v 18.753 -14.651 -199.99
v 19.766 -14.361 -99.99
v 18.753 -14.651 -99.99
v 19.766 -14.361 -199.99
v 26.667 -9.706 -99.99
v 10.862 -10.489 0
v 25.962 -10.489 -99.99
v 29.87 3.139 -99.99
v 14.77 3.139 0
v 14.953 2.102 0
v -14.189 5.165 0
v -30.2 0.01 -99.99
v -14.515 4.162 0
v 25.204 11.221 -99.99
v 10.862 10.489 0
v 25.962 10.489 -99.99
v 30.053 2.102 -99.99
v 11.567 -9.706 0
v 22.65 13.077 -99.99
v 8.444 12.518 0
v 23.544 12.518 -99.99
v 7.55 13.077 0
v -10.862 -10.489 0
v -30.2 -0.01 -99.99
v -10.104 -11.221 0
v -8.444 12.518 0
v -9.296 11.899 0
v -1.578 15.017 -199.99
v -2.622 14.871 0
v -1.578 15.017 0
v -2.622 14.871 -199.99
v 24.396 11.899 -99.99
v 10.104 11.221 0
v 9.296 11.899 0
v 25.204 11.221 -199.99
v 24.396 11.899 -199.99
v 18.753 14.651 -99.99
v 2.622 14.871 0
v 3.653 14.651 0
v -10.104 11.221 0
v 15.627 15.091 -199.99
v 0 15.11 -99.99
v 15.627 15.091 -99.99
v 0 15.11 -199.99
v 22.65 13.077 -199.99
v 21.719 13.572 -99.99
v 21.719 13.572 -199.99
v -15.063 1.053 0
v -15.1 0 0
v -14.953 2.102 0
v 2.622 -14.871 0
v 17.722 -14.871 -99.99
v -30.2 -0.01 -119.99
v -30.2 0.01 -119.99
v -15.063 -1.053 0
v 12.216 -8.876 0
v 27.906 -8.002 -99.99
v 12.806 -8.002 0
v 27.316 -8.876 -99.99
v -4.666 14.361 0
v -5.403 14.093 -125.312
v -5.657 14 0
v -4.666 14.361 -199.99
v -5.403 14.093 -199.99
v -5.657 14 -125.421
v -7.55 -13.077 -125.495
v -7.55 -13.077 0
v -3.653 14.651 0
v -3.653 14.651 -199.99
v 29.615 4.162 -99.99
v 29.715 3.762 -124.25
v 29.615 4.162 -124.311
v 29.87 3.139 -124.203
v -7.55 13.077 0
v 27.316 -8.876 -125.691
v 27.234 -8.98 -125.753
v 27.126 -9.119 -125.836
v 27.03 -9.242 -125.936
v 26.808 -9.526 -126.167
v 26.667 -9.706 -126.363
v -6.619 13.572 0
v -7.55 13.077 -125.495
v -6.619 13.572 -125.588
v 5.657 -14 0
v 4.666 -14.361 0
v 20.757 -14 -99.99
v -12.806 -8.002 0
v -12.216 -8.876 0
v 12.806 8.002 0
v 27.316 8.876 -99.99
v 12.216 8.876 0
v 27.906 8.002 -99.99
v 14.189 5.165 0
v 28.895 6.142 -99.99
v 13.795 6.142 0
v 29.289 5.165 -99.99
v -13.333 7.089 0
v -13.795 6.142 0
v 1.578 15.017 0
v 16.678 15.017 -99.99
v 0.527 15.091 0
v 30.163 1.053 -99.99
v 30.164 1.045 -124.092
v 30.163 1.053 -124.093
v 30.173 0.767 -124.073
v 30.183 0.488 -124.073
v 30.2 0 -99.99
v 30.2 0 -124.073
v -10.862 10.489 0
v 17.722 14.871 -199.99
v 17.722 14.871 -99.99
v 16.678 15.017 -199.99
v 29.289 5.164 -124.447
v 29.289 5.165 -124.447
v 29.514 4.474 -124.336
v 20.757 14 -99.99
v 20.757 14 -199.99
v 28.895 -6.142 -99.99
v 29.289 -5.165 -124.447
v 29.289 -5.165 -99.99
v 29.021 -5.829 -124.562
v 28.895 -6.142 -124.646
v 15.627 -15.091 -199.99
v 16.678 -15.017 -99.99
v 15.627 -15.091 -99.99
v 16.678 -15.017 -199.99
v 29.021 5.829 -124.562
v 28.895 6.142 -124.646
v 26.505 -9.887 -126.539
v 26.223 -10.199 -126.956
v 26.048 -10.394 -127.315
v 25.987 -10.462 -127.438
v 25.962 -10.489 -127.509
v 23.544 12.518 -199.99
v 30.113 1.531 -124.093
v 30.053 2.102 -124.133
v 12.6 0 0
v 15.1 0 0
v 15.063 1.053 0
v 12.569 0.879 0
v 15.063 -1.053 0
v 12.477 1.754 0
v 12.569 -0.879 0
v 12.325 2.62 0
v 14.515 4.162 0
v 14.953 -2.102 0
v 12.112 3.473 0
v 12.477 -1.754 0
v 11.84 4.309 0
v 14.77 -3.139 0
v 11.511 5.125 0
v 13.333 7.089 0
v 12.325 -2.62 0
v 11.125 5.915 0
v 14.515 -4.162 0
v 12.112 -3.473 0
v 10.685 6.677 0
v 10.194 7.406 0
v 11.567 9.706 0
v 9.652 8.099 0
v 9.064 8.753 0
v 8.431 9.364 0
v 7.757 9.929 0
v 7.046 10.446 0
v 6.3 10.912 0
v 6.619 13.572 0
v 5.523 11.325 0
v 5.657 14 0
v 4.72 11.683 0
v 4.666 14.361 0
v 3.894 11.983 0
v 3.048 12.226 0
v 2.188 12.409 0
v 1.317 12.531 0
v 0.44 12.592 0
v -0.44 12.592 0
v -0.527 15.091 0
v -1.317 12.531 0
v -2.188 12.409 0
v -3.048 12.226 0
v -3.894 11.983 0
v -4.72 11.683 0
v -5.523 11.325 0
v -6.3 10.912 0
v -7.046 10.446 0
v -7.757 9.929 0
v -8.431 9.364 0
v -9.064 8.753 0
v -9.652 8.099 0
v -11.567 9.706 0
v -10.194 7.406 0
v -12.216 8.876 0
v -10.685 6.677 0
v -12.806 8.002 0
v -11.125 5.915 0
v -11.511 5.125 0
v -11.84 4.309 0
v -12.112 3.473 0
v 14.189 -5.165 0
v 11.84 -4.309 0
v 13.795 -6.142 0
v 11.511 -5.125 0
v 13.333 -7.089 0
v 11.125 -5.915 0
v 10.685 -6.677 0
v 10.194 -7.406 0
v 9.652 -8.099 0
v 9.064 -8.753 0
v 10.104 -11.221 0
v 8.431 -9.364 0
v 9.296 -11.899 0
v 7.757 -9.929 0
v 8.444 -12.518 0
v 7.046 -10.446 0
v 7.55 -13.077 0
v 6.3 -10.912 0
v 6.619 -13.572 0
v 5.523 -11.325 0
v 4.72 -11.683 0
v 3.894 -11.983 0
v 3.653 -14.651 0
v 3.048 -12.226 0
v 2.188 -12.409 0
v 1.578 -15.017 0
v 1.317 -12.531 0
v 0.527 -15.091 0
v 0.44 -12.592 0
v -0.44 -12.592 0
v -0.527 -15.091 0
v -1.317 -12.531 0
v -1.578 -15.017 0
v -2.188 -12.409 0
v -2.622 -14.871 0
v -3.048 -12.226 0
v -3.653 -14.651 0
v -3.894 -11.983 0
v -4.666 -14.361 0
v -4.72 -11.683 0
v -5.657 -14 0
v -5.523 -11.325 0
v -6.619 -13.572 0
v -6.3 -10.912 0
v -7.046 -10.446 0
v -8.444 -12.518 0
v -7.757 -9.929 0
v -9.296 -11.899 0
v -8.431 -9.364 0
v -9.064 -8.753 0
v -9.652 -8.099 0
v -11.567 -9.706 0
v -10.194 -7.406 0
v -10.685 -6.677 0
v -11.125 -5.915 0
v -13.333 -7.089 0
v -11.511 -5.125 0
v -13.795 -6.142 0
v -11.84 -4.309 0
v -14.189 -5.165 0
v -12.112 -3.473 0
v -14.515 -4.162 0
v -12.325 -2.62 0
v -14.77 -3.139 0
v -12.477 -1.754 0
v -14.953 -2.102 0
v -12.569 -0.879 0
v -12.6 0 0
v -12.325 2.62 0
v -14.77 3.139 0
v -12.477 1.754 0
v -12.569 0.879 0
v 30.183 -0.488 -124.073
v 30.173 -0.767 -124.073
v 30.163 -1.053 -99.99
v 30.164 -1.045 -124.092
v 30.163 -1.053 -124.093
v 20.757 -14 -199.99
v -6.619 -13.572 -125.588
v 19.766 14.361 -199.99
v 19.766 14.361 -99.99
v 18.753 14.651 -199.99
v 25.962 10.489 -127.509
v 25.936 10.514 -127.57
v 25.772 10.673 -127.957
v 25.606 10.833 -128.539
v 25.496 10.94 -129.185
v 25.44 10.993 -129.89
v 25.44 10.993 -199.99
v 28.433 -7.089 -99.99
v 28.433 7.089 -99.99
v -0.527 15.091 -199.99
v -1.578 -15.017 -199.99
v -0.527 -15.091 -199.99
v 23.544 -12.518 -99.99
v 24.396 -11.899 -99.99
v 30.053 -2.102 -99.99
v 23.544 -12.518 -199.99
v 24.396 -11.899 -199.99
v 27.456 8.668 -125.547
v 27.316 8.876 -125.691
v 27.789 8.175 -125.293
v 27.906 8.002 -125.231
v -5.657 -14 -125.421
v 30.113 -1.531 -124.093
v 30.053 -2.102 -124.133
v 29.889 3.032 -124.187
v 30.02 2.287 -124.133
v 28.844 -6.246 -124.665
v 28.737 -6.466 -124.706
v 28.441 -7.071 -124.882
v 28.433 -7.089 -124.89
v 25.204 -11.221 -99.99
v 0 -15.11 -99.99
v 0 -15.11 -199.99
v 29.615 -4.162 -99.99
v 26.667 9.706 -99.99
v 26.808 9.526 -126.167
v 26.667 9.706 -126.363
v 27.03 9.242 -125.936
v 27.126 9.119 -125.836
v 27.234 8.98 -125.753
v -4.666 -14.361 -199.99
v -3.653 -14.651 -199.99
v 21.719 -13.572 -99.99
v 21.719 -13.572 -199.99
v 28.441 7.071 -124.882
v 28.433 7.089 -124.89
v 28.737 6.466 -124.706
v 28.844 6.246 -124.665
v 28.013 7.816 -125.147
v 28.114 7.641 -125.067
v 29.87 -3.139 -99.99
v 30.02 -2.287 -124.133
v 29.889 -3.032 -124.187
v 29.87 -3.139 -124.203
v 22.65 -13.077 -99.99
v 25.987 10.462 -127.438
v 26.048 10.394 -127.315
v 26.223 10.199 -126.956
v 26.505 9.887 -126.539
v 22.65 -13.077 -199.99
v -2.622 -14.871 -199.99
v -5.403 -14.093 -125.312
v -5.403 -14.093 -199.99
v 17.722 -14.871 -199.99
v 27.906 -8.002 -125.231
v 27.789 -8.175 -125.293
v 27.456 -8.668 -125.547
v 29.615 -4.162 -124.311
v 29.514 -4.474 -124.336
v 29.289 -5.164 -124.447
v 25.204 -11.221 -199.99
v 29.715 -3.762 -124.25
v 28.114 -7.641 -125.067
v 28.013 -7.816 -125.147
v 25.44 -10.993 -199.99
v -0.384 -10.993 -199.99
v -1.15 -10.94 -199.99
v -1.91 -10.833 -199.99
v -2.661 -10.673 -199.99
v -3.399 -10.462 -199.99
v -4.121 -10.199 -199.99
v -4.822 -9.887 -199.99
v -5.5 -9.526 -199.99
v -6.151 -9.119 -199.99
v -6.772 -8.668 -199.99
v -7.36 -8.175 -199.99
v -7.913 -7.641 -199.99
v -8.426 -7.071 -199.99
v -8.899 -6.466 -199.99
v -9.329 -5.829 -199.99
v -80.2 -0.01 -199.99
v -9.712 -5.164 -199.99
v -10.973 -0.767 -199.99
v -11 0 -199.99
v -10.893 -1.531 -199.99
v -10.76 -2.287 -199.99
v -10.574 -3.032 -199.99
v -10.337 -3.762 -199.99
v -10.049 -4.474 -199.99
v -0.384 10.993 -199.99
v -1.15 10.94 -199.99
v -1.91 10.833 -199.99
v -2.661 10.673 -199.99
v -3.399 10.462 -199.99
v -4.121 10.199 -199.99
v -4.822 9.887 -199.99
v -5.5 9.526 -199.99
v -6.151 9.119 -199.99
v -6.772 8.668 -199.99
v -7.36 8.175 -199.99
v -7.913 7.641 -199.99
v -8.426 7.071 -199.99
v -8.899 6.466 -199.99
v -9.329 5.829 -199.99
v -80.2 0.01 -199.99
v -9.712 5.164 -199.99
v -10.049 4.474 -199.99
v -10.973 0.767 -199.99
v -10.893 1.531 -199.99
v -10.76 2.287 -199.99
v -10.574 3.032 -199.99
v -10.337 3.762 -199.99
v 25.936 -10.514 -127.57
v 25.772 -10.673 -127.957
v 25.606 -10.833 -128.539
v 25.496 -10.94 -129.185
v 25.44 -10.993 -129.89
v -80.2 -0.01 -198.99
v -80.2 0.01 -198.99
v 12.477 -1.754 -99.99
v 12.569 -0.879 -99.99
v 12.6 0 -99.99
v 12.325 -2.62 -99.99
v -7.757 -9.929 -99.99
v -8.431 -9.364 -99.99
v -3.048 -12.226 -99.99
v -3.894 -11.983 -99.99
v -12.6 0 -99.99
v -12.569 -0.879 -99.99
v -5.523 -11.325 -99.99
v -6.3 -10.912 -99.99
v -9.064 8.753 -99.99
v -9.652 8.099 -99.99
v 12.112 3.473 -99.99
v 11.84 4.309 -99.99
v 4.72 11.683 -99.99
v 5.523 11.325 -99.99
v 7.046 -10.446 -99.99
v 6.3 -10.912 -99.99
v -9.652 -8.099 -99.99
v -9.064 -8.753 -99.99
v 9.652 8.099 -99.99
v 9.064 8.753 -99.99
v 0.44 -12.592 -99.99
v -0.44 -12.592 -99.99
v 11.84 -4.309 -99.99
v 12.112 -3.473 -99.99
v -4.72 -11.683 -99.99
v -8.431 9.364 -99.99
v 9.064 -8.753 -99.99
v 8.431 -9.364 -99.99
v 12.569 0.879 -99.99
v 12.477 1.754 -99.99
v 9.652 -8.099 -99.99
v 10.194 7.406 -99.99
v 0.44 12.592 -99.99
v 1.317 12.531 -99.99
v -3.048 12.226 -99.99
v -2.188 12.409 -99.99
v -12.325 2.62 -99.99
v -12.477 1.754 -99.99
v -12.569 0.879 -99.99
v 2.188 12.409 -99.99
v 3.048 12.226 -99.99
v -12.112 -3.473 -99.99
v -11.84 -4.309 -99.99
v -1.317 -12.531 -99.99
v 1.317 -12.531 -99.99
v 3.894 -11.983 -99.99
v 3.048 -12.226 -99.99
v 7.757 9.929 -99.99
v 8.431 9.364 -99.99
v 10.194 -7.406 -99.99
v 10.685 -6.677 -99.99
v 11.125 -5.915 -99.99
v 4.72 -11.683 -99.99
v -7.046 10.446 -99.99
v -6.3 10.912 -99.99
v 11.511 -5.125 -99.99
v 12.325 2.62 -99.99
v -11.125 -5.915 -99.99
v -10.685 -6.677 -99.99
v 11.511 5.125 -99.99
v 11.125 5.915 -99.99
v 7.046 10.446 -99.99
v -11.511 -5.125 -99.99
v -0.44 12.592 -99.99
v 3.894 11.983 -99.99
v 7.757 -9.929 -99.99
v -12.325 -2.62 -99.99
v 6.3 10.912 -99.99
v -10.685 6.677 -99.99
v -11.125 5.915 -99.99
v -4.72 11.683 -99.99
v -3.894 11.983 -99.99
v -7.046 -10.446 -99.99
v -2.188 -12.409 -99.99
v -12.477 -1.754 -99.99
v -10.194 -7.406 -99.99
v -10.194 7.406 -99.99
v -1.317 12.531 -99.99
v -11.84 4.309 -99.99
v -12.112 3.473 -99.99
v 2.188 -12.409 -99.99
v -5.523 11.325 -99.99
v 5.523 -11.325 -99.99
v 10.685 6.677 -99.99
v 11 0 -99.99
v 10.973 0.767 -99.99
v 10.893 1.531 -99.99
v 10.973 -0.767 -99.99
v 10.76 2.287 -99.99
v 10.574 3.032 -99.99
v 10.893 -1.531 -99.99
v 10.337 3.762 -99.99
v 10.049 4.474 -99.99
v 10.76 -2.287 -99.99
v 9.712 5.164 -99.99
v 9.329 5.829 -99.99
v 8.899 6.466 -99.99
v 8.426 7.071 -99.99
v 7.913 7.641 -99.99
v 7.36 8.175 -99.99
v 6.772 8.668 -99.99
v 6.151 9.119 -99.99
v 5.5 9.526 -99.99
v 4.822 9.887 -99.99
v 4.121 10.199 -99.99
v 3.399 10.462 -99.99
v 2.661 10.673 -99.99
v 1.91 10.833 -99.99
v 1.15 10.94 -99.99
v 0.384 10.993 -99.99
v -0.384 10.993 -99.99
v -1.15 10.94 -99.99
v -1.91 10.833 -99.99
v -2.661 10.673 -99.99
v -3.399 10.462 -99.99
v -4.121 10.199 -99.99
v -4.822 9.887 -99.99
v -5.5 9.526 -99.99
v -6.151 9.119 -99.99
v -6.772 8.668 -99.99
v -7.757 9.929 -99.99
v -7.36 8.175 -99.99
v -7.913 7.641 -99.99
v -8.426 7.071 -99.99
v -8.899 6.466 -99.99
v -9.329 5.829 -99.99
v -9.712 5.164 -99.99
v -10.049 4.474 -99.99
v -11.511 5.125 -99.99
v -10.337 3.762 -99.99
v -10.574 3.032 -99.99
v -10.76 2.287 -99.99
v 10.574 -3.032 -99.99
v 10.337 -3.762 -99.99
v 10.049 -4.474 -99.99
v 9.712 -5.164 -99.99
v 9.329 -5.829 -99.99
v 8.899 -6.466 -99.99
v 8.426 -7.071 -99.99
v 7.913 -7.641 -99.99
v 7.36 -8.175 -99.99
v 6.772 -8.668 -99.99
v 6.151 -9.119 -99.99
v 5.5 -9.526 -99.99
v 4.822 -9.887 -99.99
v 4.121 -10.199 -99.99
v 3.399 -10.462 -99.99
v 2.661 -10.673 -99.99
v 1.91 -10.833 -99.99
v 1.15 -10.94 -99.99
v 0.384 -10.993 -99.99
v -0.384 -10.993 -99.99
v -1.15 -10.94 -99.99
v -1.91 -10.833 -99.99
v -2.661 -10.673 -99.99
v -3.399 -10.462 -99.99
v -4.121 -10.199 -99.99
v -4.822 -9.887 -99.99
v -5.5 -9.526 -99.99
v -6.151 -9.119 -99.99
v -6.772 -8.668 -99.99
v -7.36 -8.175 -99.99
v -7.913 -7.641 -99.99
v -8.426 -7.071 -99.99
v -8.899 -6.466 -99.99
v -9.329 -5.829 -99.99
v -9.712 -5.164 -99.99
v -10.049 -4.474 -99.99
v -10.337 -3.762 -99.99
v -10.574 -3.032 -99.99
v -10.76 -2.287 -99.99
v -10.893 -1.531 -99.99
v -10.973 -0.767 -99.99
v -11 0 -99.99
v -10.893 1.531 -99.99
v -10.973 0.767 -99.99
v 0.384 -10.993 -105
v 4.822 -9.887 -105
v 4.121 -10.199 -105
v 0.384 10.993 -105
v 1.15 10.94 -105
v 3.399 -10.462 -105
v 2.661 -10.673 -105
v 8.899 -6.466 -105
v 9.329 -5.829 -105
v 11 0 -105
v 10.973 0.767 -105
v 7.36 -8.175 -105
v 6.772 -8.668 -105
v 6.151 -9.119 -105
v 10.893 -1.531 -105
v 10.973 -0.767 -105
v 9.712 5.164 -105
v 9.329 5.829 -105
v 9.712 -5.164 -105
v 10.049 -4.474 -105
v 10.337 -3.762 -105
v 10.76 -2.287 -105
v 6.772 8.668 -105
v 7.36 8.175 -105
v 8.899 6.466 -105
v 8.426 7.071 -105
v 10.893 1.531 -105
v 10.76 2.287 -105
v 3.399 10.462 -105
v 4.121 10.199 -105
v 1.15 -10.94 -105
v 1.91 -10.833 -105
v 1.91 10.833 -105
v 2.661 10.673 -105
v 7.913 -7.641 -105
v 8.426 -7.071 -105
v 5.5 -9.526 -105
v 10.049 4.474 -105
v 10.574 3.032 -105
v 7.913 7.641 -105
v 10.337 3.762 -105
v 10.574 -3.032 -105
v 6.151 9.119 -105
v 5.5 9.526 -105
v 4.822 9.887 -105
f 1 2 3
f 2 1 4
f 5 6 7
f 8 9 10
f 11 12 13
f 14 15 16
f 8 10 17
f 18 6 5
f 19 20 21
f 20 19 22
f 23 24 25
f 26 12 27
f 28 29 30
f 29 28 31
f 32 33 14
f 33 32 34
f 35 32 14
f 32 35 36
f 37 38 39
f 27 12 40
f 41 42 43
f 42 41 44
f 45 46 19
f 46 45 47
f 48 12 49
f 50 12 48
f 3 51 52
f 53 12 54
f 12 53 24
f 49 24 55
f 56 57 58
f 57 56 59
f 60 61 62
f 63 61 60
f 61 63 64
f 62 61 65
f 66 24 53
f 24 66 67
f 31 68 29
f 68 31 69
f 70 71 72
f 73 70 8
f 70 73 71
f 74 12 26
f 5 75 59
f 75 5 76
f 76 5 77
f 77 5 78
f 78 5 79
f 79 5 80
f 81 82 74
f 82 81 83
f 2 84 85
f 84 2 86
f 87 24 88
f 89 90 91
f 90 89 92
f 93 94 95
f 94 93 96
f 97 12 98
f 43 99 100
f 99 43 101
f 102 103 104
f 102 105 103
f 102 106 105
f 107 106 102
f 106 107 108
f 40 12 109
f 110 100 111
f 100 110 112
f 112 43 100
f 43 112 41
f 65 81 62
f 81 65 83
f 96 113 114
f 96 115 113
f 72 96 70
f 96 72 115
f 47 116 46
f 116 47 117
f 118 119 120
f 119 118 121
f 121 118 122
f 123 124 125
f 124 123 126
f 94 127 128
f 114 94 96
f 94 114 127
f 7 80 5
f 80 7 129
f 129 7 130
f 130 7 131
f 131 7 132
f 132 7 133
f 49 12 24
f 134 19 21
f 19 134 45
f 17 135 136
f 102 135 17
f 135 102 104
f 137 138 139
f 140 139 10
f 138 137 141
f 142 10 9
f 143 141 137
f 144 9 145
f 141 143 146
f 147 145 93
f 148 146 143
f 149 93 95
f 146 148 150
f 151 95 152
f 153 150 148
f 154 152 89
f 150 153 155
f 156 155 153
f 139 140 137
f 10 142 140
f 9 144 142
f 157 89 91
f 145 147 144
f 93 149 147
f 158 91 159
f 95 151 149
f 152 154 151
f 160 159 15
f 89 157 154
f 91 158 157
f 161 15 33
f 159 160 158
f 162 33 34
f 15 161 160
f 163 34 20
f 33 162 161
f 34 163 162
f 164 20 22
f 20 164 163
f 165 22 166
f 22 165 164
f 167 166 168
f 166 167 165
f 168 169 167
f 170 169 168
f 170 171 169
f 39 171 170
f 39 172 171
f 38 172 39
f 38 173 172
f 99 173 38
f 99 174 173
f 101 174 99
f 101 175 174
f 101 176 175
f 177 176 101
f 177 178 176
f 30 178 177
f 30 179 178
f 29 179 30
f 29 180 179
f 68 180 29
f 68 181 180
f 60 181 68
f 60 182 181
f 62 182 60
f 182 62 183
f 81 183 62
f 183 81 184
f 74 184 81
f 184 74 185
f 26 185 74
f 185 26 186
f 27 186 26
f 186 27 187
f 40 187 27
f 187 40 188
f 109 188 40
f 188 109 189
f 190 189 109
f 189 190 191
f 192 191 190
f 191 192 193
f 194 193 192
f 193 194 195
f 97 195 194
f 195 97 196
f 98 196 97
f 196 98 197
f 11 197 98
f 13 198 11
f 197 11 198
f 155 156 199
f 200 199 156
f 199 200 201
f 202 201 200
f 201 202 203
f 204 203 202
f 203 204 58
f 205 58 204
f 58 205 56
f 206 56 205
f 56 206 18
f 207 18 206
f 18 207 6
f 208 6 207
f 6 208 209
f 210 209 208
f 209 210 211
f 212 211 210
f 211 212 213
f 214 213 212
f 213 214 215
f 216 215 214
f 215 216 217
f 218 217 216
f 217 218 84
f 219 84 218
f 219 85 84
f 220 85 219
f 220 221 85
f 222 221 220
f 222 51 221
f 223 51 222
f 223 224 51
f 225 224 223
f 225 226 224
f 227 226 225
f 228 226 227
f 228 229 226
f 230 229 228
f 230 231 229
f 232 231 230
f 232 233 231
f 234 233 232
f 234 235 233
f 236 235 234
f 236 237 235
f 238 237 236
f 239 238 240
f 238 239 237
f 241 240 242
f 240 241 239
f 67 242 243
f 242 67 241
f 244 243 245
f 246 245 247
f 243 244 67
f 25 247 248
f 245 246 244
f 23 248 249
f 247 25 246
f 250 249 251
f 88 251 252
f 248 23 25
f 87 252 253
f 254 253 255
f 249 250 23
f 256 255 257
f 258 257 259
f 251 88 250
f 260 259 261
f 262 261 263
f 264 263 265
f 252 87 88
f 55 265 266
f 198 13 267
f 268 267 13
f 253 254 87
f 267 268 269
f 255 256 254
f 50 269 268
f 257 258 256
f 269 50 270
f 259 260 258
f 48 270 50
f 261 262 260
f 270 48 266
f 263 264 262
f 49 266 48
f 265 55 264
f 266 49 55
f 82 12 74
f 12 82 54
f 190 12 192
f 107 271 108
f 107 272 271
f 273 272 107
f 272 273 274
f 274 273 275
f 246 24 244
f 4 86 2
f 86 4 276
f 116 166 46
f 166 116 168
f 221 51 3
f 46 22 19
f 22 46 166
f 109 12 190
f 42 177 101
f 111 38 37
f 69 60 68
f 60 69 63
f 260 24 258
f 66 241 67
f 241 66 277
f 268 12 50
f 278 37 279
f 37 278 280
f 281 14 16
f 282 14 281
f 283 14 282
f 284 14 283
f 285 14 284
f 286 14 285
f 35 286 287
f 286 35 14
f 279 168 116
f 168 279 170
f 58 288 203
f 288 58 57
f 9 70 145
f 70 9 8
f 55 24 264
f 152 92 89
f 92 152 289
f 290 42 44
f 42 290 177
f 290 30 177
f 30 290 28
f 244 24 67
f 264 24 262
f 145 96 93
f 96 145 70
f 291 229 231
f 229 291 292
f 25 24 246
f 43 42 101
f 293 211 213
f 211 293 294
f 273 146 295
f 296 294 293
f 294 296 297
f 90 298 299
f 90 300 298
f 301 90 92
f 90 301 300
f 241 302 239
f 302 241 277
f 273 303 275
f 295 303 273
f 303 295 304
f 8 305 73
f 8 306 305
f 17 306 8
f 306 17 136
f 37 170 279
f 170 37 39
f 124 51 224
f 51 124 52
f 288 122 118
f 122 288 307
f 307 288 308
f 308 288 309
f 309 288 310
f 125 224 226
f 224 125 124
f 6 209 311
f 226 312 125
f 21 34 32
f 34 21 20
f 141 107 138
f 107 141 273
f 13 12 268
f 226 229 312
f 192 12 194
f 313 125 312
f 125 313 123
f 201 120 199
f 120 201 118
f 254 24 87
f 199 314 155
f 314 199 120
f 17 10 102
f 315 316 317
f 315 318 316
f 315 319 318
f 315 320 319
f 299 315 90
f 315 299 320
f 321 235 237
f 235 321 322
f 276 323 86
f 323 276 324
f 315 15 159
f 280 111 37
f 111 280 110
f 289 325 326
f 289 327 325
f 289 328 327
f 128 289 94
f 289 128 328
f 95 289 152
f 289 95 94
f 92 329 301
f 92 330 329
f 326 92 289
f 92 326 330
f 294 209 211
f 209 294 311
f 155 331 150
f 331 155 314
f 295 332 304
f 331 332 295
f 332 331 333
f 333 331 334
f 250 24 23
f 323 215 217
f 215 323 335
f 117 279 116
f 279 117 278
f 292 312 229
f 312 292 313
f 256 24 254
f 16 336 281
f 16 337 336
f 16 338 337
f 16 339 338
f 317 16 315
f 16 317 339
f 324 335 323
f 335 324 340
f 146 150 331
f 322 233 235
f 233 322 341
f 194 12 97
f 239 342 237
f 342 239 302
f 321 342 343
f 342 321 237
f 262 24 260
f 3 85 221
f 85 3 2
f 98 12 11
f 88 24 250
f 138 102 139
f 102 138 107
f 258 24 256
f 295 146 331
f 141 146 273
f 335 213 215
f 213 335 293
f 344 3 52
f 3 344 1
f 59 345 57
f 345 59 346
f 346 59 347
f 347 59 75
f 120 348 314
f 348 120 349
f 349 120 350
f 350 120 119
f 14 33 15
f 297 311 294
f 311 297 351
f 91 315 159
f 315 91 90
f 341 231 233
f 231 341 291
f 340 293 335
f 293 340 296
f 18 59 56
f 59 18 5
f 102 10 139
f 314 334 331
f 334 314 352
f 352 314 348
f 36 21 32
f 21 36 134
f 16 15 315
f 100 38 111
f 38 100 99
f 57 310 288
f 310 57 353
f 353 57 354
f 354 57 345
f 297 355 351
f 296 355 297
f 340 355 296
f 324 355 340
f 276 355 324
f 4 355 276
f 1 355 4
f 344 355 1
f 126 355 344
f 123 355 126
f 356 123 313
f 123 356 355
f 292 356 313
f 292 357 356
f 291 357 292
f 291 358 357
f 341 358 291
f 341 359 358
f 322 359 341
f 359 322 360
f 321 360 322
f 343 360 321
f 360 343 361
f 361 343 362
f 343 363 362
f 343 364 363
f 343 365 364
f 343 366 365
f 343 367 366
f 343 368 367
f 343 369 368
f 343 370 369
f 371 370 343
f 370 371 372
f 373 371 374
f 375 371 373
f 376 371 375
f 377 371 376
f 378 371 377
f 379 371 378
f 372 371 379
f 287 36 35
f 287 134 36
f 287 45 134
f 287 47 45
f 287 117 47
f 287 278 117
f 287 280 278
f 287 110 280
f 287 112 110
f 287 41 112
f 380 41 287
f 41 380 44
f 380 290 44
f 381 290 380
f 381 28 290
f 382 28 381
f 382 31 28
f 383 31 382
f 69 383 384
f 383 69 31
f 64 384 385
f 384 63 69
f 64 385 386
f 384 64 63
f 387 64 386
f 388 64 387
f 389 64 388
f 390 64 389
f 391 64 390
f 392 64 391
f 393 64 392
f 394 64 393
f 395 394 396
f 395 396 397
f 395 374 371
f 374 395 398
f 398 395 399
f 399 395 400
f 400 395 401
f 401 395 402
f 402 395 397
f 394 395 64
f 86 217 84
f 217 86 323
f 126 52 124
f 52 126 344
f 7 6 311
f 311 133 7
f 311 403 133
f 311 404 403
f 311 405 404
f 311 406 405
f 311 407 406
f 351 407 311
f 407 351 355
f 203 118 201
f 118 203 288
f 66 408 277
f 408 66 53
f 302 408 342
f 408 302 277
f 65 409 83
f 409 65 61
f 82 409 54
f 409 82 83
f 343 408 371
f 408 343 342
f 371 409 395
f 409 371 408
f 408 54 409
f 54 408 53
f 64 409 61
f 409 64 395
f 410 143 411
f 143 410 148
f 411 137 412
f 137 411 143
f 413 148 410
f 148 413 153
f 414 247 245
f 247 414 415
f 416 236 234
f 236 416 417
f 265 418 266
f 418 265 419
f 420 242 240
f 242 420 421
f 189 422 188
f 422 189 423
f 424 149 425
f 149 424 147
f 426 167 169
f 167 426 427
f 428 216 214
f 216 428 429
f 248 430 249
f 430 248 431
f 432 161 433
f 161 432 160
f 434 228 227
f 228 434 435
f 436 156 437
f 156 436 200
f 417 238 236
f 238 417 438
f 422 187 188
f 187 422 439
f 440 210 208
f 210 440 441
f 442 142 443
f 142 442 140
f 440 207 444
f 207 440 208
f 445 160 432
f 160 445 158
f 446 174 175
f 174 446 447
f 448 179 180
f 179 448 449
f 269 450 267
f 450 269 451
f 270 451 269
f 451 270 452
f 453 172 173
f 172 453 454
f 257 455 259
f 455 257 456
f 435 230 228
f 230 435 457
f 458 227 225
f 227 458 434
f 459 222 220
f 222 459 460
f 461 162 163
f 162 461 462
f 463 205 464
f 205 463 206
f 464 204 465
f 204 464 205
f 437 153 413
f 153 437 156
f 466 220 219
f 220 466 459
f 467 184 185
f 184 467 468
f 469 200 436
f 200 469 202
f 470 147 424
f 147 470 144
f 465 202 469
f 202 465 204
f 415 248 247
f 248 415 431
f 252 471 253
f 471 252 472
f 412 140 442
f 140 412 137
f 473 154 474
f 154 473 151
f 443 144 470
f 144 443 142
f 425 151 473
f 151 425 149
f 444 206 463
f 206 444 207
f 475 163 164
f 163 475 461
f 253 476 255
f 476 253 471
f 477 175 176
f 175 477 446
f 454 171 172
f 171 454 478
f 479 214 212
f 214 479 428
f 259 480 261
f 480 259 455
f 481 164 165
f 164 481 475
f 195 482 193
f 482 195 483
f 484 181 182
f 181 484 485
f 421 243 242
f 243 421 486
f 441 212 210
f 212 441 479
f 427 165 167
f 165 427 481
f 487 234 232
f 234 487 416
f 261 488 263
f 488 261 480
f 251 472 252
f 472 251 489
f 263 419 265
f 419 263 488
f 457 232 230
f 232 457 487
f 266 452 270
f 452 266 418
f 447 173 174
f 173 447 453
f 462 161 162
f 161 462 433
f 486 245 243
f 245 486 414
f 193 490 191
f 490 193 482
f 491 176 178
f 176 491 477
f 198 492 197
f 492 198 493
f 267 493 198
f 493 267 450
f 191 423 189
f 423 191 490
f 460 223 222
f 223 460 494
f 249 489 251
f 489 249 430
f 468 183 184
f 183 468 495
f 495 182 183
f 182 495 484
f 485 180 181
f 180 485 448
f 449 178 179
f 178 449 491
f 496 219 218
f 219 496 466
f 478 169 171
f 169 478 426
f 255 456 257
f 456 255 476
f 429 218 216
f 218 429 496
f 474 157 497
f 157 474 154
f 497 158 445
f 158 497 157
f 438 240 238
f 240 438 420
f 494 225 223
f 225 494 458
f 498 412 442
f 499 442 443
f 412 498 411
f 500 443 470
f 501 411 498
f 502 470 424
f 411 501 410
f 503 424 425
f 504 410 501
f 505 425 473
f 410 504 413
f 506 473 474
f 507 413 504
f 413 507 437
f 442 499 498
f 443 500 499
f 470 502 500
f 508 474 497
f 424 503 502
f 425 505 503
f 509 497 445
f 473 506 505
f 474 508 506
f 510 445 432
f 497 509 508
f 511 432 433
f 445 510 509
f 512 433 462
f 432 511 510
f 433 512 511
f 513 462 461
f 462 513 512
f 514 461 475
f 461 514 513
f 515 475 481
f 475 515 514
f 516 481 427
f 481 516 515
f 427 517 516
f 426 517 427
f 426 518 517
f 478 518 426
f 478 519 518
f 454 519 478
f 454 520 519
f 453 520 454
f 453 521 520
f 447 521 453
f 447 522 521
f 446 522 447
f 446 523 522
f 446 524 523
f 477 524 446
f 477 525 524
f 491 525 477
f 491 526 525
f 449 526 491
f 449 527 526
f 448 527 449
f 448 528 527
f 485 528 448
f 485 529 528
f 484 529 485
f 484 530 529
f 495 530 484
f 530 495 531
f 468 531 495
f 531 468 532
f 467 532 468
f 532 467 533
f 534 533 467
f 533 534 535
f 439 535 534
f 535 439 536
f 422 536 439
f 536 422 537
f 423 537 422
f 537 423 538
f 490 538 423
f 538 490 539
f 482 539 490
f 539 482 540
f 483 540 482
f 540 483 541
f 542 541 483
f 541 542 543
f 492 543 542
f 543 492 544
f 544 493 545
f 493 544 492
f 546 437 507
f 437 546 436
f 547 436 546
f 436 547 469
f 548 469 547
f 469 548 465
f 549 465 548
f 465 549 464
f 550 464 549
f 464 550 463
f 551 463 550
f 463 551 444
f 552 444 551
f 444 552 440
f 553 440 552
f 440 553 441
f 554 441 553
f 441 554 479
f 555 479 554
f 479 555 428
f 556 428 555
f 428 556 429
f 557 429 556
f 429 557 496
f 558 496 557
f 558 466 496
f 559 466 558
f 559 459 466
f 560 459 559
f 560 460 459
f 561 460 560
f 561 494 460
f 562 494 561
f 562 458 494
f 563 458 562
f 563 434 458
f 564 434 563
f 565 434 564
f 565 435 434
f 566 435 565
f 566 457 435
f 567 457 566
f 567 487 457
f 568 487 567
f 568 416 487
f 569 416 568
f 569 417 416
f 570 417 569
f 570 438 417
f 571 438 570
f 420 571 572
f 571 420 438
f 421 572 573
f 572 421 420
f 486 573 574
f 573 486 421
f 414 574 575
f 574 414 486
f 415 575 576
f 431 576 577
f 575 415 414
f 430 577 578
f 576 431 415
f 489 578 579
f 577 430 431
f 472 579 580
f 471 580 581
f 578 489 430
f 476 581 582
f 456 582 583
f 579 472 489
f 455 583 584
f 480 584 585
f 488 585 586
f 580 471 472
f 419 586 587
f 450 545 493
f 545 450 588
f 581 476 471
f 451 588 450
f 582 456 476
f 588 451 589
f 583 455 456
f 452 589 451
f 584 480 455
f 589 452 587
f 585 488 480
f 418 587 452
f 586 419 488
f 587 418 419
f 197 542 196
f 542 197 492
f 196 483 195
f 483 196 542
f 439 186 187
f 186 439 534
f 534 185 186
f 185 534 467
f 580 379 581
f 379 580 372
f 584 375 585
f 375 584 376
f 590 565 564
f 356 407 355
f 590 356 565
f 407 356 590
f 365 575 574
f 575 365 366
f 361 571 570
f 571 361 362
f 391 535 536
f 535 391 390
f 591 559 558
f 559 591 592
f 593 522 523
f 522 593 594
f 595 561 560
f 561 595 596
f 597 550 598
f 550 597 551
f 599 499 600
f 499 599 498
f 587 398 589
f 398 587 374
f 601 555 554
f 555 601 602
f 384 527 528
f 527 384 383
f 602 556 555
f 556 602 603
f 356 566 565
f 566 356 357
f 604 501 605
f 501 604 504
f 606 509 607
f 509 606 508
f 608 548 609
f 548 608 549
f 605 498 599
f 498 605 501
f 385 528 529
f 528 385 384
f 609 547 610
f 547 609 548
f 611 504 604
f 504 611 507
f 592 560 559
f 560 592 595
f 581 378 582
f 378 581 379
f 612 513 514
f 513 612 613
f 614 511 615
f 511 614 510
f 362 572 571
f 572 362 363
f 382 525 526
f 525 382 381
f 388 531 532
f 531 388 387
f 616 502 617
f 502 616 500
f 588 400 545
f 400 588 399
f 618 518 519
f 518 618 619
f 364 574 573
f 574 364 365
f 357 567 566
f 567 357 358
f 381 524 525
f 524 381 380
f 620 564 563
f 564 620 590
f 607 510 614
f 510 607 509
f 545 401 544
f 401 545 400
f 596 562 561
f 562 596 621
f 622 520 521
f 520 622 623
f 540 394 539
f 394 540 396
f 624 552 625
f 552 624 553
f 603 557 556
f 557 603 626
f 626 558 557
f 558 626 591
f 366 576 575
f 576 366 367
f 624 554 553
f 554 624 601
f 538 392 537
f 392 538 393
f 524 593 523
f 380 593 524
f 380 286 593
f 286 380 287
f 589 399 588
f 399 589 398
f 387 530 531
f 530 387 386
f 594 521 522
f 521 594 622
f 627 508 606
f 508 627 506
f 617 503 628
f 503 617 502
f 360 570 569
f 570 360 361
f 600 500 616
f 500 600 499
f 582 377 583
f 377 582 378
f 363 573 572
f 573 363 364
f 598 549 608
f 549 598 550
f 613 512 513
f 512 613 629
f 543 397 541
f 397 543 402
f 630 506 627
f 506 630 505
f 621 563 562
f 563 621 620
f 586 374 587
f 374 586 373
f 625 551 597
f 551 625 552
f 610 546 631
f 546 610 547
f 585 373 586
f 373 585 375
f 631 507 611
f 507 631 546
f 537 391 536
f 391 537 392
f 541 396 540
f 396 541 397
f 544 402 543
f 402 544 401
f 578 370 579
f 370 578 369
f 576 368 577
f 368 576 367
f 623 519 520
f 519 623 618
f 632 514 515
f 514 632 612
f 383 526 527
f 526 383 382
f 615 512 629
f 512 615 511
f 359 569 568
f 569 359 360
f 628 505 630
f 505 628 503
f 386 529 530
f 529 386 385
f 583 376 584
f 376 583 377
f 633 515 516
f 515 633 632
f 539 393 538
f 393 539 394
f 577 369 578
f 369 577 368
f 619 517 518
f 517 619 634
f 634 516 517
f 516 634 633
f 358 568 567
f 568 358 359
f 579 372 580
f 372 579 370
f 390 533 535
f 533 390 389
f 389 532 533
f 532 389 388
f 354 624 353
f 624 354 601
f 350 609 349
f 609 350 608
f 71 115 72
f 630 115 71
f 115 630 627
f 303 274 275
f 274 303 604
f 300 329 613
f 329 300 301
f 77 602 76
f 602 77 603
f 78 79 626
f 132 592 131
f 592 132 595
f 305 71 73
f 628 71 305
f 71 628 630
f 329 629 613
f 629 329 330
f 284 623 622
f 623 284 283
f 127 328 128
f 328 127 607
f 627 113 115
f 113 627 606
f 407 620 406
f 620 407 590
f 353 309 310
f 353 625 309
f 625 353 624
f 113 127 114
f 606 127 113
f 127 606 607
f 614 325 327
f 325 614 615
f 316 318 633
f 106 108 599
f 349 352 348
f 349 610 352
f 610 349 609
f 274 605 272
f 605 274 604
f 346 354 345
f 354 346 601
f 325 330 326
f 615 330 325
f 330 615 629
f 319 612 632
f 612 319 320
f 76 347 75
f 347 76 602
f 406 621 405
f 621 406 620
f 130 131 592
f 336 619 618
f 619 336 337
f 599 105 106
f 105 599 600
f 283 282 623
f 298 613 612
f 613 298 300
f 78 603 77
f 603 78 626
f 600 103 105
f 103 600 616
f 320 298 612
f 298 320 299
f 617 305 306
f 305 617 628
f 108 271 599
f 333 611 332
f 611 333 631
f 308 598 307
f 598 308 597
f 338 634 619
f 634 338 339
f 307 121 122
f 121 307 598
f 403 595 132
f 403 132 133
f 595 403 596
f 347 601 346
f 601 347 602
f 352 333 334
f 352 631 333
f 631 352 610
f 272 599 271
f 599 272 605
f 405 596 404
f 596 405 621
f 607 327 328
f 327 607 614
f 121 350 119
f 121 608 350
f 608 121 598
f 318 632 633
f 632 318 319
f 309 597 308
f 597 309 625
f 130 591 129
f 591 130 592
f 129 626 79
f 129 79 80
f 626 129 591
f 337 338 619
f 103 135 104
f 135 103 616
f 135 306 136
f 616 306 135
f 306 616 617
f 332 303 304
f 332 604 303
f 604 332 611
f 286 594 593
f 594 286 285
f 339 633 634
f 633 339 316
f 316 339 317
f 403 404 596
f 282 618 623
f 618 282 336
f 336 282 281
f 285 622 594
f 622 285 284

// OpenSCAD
tubeoutsidediameter=25.2;
tubeinsidediameter=22;
outsidediameter=tubeoutsidediameter+5;
lowerheight=100;
upperheight=100;
bottomheight=10;
tubebottom=5;
flatheight=80;
heightadjustdiameter=60;
heightadjustheight=10;
heightadjustnarrow=10;
totalheight=lowerheight+upperheight+bottomheight;
ploughdistance=50;

$fn=90;
  
module triangle(x,y,z,mode) {
  if (mode==0) {
    translate([0,y,0]) rotate([90,0,0]) linear_extrude(height=y) polygon(points=[[0,0],[x,z],[x,0]]);
  } else if (mode==1) {
    translate([0,y,0]) rotate([90,0,0]) linear_extrude(height=y) polygon(points=[[0,0],[0,z],[x,z]]);
  } else if (mode==2) {
    translate([0,y,0]) rotate([90,0,0]) linear_extrude(height=y) polygon(points=[[0,0],[0,z],[x,0]]);
  } else if (mode==3) {
    translate([0,y,0]) rotate([90,0,0]) linear_extrude(height=y) polygon(points=[[0,z],[x,z],[x,0]]);
  } else if (mode==4) {
    translate([x,0,0]) rotate([0,0,90]) linear_extrude(height=z) polygon(points=[[0,0],[y,x],[y,0]]);
  } else if (mode==5) {
    translate([x,0,0]) rotate([0,0,90]) linear_extrude(height=z) polygon(points=[[0,0],[0,x],[y,x]]);
  } else if (mode==6) {
    translate([x,0,0]) rotate([0,0,90]) linear_extrude(height=z) polygon(points=[[0,0],[0,x],[y,0]]);
  } else if (mode==7) {
    translate([x,0,0]) rotate([0,0,90]) linear_extrude(height=z) polygon(points=[[0,x],[y,x],[y,0]]);
  } else if (mode==8) {
    translate([0,0,z]) rotate([0,90,0]) linear_extrude(height=x) polygon(points=[[0,0],[z,y],[z,0]]);
  } else if (mode==9) {
    translate([0,0,z]) rotate([0,90,0]) linear_extrude(height=x) polygon(points=[[0,0],[0,y],[z,y]]);
  } else if (mode==10) {
    translate([0,0,z]) rotate([0,90,0]) linear_extrude(height=x) polygon(points=[[0,0],[0,y],[z,0]]);
  } else if (mode==11) {
    translate([0,0,z]) rotate([0,90,0]) linear_extrude(height=x) polygon(points=[[0,y],[z,y],[z,0]]);
  }
}

rotate([180,0,0]) difference() {
  union() {
    //translate([0,0,totalheight-flatheight]) cylinder(d=heightadjustdiameter,h=heightadjustheight);
    //translate([0,0,totalheight-flatheight+heightadjustnarrow-0.01]) cylinder(d2=outsidediameter,d1=heightadjustdiameter,h=heightadjustnarrow);
    
    hull() {
      cylinder(d=outsidediameter,h=upperheight);
      translate([0,0,upperheight-0.01]) cylinder(h=lowerheight,d=outsidediameter);
      translate([outsidediameter/2,0,upperheight-0.01]) cylinder(h=lowerheight,d=outsidediameter);
      translate([-outsidediameter,0.01,lowerheight-0.01]) triangle(outsidediameter,outsidediameter/2,lowerheight,6);
      translate([-outsidediameter,-outsidediameter/2-0.01,lowerheight-0.01]) triangle(outsidediameter,outsidediameter/2,lowerheight,4);
    }
    hull() {
      translate([-outsidediameter,0.01,lowerheight+upperheight-flatheight-0.01]) triangle(outsidediameter,outsidediameter/2,1,6);
      translate([-outsidediameter,-outsidediameter/2-0.01,lowerheight+upperheight-flatheight-0.01]) triangle(outsidediameter,outsidediameter/2,1,4);
      translate([-outsidediameter-ploughdistance,0.01,lowerheight+upperheight-1-0.01]) triangle(outsidediameter+ploughdistance,outsidediameter/2,1,6);
      translate([-outsidediameter-ploughdistance,-outsidediameter/2-0.01,lowerheight+upperheight-1-0.01]) triangle(outsidediameter+ploughdistance,outsidediameter/2,1,4);
    }
  }

  translate([0,0,-0.01]) cylinder(d=tubeoutsidediameter,h=upperheight);
translate([0,0,upperheight-0.02]) cylinder(d=tubeinsidediameter,h=lowerheight);
  hull() {
    translate([0,0,upperheight+tubebottom]) cylinder(d=tubeinsidediameter,h=lowerheight+bottomheight);
    translate([outsidediameter,0,upperheight+tubebottom+30]) cylinder(d=tubeinsidediameter,h=lowerheight+bottomheight);
  }
}
